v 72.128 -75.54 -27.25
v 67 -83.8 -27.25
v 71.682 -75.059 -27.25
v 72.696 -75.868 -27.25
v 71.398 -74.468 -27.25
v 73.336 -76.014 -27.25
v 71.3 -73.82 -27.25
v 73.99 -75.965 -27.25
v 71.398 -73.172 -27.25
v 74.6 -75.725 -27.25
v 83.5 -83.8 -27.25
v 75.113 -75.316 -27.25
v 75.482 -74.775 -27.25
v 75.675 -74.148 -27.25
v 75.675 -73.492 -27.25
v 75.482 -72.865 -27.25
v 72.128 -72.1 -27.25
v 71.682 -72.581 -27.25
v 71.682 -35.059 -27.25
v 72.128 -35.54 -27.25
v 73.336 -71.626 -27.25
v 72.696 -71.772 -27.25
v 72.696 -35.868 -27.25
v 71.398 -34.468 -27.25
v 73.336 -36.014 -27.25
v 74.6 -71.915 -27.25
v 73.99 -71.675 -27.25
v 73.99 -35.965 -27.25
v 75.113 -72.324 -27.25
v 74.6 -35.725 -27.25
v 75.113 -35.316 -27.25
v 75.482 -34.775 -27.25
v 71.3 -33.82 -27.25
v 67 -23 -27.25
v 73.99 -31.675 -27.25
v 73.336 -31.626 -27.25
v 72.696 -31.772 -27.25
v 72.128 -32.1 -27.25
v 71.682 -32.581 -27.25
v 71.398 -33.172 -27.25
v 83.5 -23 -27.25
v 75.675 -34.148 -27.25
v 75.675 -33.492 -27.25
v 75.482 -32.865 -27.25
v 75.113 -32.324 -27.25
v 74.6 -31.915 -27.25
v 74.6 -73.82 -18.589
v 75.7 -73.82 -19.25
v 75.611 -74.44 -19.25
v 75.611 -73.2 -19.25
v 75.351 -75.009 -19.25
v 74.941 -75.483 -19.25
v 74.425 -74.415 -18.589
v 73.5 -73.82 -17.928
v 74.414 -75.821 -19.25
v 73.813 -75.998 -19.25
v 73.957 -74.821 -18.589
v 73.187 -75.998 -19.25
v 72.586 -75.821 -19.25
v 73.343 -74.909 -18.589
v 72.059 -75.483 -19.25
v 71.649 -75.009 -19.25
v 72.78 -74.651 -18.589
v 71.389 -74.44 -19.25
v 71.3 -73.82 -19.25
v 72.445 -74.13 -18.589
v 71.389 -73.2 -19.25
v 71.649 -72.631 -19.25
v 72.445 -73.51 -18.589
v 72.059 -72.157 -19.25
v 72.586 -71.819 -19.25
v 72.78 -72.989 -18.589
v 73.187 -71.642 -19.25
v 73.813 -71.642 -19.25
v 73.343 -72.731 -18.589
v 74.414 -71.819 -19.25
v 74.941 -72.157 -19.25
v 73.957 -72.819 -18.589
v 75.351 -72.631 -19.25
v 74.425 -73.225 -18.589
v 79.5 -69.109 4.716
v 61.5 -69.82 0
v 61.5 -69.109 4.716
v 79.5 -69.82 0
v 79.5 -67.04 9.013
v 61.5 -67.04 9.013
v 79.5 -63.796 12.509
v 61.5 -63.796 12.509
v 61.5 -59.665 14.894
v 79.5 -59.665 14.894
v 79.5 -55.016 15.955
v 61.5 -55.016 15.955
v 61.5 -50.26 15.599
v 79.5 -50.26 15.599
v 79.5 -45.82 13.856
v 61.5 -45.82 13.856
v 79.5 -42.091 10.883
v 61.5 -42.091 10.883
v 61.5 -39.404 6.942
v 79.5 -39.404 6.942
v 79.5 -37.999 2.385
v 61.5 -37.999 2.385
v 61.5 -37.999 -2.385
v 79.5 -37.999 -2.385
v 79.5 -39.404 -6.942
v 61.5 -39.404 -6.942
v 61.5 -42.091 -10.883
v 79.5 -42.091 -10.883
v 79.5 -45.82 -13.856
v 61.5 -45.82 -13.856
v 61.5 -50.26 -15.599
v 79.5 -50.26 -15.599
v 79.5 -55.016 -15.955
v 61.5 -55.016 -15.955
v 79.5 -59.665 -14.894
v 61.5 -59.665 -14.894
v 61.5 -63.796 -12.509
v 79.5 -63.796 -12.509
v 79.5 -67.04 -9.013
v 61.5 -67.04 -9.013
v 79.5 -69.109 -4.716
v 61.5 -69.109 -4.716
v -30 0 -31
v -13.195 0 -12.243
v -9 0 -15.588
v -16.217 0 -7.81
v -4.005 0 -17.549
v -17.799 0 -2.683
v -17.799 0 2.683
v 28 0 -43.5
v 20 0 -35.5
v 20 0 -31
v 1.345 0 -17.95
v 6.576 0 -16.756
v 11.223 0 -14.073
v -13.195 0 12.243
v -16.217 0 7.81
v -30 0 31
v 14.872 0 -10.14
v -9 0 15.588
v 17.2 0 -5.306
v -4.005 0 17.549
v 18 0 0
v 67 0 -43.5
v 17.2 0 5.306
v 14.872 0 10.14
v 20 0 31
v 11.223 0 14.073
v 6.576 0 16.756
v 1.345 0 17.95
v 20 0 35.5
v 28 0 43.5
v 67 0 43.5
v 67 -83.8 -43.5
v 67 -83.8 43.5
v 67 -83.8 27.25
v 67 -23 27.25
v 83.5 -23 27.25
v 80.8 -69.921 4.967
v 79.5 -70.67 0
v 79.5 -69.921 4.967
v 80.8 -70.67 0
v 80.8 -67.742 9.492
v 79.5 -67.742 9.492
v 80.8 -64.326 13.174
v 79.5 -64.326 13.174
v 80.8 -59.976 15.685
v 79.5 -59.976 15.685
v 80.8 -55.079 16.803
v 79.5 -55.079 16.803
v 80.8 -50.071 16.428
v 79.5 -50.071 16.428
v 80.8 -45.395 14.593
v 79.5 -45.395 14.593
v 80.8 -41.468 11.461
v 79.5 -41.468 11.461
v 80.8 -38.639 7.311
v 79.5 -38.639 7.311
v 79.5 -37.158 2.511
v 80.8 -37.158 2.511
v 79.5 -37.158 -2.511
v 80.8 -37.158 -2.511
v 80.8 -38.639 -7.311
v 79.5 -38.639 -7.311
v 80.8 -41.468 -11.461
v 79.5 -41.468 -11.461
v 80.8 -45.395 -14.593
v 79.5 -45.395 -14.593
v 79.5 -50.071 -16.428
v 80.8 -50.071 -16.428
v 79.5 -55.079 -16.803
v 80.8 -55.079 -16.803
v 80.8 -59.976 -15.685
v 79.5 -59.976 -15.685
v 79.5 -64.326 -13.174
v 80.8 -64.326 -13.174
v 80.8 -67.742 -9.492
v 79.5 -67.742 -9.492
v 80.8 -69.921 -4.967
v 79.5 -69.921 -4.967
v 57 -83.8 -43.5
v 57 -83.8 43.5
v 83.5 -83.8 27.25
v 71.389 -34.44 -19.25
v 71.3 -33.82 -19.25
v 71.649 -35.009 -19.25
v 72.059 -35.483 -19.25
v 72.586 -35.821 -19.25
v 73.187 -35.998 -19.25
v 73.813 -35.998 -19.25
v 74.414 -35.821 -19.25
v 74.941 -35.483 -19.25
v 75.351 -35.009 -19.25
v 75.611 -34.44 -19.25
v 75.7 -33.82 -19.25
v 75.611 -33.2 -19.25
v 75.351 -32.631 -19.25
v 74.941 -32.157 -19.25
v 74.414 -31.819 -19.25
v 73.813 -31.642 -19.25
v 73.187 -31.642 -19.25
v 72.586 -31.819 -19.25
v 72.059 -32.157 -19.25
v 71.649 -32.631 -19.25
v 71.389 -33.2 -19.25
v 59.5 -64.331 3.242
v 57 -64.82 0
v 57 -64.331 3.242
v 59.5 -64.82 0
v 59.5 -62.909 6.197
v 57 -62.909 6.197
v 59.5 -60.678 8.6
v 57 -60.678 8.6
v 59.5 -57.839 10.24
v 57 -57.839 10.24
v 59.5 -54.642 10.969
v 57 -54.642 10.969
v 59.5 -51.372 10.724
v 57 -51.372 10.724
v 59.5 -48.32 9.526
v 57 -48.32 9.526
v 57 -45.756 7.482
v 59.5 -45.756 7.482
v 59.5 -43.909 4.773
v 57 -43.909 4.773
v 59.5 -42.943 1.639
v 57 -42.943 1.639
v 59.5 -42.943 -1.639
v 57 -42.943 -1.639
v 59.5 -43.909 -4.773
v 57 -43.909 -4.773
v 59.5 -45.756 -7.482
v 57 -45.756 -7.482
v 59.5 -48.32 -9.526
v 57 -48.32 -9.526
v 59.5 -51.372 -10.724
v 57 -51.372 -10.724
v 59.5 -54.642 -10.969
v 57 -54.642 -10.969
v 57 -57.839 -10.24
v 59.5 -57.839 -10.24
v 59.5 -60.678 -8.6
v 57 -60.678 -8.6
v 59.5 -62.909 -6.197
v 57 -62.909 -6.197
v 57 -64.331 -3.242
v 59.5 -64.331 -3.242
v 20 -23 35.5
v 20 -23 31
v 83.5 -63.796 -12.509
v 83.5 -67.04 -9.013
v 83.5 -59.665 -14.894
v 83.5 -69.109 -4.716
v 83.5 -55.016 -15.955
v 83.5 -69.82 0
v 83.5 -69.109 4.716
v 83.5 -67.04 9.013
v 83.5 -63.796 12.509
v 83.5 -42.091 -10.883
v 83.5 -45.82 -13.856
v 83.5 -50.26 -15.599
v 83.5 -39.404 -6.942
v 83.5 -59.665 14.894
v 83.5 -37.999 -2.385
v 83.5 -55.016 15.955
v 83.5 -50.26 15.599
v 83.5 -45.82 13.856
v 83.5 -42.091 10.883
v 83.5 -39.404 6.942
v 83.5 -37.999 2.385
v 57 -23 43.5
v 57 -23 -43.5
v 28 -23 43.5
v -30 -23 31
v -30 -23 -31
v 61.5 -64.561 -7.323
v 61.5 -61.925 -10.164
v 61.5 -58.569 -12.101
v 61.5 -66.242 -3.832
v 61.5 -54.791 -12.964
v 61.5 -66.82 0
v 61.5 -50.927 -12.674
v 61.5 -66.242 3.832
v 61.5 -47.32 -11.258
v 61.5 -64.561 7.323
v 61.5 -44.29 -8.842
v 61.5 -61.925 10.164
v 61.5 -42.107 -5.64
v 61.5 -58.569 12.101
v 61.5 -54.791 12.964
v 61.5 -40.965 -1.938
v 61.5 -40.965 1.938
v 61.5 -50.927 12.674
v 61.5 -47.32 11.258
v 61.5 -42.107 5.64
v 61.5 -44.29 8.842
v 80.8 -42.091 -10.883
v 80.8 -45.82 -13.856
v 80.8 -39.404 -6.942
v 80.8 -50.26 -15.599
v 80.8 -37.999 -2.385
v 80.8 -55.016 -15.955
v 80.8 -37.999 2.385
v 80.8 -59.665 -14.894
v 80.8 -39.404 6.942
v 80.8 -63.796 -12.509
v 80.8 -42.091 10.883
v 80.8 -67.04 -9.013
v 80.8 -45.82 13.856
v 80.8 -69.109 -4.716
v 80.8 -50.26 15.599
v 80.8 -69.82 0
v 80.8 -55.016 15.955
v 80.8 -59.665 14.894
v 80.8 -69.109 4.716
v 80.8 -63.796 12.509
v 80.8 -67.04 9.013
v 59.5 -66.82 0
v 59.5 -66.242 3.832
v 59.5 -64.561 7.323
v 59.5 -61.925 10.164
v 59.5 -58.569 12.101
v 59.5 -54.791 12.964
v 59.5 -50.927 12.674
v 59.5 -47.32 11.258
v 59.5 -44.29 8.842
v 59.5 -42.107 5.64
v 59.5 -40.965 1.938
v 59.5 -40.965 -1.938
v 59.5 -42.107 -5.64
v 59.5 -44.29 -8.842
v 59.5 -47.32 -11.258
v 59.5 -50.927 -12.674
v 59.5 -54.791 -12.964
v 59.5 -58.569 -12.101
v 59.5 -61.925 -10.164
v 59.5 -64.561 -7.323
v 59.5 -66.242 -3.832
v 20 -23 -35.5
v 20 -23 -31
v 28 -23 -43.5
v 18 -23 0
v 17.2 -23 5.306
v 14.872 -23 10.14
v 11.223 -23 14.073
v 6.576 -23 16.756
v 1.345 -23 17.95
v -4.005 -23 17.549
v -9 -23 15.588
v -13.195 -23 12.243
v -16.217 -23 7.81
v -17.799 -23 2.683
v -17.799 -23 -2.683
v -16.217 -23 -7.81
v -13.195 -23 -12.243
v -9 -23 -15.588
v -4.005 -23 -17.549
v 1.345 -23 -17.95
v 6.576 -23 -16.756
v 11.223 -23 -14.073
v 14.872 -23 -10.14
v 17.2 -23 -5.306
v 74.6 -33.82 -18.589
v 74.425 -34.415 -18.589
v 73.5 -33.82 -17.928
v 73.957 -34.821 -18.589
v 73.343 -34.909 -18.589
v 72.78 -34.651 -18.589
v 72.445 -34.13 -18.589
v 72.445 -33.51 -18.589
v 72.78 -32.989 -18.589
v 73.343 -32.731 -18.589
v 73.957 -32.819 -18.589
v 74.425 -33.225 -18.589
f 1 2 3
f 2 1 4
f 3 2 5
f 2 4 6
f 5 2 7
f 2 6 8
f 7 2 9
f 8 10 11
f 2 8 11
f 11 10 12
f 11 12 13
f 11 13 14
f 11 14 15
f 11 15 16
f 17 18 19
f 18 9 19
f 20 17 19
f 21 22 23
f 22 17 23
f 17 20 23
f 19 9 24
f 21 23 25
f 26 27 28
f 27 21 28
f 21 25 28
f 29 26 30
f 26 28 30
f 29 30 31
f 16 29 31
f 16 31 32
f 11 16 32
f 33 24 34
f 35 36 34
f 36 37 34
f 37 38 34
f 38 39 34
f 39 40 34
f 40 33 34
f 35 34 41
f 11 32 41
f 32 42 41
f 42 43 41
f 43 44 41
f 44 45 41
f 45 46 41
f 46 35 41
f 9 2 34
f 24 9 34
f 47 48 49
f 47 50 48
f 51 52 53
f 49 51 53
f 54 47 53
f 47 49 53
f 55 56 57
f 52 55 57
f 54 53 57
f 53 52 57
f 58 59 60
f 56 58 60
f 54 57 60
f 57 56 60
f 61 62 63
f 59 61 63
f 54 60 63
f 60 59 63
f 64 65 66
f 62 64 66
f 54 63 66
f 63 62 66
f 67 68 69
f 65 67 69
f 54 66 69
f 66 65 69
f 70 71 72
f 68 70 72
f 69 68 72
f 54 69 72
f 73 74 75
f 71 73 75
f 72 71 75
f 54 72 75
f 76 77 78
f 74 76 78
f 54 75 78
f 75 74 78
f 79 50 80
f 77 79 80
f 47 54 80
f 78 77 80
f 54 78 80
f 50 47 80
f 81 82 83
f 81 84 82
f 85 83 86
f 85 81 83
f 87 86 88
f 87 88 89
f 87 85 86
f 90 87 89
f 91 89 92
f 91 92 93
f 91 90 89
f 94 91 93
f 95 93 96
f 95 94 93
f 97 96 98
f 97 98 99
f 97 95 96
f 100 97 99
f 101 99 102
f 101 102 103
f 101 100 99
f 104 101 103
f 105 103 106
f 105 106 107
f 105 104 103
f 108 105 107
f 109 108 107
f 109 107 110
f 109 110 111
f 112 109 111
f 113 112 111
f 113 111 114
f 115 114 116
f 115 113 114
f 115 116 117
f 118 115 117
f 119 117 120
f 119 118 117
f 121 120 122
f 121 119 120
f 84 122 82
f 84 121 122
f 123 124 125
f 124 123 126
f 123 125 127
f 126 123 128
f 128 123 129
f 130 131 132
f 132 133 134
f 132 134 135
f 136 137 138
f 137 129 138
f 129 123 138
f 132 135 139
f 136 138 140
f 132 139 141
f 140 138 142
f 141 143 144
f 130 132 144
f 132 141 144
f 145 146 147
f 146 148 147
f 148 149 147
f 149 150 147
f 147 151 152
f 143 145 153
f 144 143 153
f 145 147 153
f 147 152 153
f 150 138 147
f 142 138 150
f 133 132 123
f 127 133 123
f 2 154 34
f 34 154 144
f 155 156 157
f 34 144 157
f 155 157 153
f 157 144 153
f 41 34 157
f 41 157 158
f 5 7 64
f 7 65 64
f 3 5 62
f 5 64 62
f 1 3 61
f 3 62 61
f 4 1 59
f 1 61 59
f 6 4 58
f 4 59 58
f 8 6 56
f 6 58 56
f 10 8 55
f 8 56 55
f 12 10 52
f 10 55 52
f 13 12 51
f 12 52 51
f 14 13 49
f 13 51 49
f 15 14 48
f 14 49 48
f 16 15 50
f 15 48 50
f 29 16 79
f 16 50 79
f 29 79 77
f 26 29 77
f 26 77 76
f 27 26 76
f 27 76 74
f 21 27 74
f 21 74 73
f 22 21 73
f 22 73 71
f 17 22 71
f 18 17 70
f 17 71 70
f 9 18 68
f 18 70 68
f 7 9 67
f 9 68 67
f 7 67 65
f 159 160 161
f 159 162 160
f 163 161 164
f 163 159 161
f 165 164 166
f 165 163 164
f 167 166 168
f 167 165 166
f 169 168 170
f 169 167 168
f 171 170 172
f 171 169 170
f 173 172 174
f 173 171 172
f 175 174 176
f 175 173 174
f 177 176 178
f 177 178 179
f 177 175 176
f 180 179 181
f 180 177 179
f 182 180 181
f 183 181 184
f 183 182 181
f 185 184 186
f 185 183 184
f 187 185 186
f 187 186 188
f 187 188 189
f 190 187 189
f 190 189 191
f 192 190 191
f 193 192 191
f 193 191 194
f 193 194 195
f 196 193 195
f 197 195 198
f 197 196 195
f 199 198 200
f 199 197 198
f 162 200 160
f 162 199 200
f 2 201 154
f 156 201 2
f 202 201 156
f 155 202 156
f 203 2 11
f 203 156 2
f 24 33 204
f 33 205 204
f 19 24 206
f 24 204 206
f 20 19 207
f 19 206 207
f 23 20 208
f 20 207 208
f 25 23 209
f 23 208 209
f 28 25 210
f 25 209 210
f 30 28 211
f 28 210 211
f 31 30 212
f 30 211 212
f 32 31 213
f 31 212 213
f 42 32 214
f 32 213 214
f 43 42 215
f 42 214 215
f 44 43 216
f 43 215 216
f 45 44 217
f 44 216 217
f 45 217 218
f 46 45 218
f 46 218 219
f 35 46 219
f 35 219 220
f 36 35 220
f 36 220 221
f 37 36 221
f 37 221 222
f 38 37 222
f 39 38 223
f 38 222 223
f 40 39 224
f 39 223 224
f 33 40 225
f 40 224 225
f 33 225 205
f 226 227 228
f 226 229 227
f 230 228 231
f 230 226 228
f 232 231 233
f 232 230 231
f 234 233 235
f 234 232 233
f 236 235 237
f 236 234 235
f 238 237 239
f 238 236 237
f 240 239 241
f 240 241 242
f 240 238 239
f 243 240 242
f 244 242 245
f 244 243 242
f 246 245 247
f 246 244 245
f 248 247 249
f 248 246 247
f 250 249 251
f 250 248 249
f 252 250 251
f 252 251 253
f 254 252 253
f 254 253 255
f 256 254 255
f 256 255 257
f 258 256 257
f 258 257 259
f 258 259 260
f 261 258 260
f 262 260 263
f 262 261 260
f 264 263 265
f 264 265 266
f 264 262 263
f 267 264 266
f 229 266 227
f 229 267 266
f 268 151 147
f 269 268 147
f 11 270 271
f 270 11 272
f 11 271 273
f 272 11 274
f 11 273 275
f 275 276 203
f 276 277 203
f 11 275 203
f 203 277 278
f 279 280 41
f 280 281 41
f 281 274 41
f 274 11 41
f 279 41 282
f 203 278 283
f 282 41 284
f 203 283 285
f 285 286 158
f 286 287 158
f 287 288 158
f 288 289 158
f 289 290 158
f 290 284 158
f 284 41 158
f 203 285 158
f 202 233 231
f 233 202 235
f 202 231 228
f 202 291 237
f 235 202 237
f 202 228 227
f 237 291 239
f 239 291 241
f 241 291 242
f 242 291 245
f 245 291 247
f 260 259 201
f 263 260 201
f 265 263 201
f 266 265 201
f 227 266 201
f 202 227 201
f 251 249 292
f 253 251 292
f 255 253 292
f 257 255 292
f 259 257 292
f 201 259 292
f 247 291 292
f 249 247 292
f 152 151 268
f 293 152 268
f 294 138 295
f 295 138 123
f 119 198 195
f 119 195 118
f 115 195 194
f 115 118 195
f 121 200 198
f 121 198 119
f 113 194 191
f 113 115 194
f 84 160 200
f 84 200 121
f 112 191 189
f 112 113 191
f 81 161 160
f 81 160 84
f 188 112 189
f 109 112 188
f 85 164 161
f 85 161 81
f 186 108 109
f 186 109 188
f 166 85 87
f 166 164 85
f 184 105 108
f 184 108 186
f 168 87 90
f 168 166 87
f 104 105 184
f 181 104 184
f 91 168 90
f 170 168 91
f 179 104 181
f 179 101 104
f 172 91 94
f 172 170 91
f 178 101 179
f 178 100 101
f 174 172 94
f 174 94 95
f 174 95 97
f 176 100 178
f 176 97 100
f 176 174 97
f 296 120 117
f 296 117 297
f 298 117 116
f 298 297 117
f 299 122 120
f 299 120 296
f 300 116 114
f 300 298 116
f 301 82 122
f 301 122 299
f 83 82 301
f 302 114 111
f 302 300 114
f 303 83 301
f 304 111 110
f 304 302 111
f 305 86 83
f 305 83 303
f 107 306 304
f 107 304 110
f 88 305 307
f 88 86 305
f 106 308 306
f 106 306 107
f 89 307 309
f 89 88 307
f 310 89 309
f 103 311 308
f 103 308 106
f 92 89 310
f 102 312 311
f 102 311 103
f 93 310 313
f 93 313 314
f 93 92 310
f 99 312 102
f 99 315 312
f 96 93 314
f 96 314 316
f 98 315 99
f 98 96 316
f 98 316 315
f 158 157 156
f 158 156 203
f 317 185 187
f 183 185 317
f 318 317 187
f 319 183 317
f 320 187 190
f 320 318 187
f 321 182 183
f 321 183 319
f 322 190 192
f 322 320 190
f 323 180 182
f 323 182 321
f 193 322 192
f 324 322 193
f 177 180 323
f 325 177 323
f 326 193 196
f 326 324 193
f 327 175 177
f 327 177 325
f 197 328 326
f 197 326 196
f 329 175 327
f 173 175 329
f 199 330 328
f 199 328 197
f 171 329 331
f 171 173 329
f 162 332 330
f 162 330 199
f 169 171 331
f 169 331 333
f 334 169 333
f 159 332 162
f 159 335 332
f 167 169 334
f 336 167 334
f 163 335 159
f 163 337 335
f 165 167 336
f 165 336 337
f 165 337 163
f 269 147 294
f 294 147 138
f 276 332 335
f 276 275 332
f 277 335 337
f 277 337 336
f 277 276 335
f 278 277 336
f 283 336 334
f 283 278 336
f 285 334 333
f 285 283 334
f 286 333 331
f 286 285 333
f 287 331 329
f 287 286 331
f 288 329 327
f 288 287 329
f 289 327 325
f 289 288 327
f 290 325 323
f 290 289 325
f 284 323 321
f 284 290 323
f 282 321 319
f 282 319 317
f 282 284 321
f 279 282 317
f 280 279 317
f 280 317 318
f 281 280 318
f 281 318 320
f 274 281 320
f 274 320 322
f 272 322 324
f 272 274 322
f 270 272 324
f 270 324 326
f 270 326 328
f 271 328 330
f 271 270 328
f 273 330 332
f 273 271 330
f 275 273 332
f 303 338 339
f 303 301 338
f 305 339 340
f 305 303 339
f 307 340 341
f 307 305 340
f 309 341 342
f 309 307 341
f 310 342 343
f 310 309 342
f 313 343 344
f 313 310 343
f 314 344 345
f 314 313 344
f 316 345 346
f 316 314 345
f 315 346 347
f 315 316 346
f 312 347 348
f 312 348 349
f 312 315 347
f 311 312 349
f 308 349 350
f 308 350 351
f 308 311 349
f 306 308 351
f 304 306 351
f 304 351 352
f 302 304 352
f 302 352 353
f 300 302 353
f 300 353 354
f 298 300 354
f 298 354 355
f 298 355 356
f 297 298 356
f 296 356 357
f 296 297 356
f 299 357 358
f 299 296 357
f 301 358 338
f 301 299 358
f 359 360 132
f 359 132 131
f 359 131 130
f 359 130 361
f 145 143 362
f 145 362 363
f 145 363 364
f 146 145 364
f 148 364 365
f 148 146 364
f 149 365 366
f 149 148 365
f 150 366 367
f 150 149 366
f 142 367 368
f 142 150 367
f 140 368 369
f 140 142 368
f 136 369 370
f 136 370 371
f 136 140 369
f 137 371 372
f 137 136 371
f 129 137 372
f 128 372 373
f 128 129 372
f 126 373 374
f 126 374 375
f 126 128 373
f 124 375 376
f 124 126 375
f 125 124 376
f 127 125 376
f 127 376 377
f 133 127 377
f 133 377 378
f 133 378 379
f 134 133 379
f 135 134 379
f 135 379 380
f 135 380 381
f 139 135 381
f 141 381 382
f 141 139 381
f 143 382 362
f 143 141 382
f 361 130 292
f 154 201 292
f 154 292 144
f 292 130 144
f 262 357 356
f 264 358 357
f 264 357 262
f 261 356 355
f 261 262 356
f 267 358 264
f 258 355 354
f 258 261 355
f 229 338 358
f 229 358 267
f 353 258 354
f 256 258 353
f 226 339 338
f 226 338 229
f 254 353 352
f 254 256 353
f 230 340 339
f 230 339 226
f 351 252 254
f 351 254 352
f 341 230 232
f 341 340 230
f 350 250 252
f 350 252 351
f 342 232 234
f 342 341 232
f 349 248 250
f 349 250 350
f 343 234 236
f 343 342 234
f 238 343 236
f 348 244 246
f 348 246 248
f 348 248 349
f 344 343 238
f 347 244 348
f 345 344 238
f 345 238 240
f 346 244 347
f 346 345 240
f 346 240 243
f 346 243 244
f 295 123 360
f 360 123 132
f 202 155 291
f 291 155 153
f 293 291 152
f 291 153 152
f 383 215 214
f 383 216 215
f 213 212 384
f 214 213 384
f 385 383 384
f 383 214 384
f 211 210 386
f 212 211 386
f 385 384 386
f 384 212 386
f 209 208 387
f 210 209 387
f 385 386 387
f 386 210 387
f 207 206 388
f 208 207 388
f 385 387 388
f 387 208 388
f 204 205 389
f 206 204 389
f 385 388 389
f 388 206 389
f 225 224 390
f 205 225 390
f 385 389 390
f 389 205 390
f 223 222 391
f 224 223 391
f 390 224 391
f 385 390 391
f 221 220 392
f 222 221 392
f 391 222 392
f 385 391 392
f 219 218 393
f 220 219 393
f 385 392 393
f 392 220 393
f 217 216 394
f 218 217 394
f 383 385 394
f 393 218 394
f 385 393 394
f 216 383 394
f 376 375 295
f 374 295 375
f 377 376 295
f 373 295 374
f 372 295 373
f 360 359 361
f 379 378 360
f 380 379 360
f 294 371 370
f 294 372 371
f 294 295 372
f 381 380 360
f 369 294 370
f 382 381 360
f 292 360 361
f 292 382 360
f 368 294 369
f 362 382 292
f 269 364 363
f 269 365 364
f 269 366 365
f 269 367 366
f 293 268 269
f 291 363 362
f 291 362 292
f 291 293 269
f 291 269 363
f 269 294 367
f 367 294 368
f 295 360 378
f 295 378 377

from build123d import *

# Parameters (mm, degrees)
F0_R     = 18
F1_DEPTH = 23
F2_DEPTH = 83.8
F3_START = 23
F0_W     = 16.5
F0_H     = 54.5
F3_DEPTH = 60.8
F6_SIZE2 = 8
F6_SIZE  = 8
F8_D     = 4.4
F8_DEPTH = 8
F8_TIP   = 1.3218933619


with BuildPart() as f1:
    # F0 (on Front) → F1 (new body)
    with BuildSketch(Plane.XZ):
        Polygon((-30, 31), (-30, -31), (20, -31), (20, -43.5), (57, -43.5), (57, 43.5), (20, 43.5), (20, 31), align=None)
        Circle(F0_R, mode=Mode.SUBTRACT)
    extrude(amount=F1_DEPTH)

    # F0 (on Front) → F2 (join)
    with BuildSketch(Plane.XZ):
        Polygon((57, 43.5), (57, -43.5), (67, -43.5), (67, -27.25), (67, 27.25), (67, 43.5), align=None)
    extrude(amount=F2_DEPTH)

    # F0 (on Front) → F3 (join)
    with BuildSketch(Plane.XZ.offset(F3_START)):
        with Locations((75.25, 0)):
            Rectangle(F0_W, F0_H)
    extrude(amount=F3_DEPTH)

    # F4 (on Top) → F5 (revolve, cut)
    with BuildSketch(Plane.XY):
        Polygon((57, -53.82), (57, -64.82), (59.5, -64.82), (59.5, -66.82), (61.5, -66.82), (61.5, -69.82), (79.5, -69.82), (79.5, -70.67), (80.8, -70.67), (80.8, -69.82), (83.5, -69.82), (83.5, -53.82), align=None)
    revolve(axis=Axis((70.25, -53.82, 0), (-1, 0, 0)), mode=Mode.SUBTRACT)

    # F6
    f6_edges = [f1.edges().sort_by_distance(p)[0] for p in [
        (20, -11.5, 43.5),
        (20, -11.5, -43.5),
    ]]
    chamfer(f6_edges, length=F6_SIZE, length2=F6_SIZE2)

    # F8
    with Locations(Plane(origin=(0, 0, -27.25), x_dir=(1, 0, 0), z_dir=(0, 0, -1))):
        with Locations((73.5, 73.82), (73.5, 33.82)):
            Hole(F8_D / 2, depth=F8_DEPTH)
            with Locations((0, 0, -(F8_DEPTH + F8_TIP / 2))):  # 118° drill point
                Cone(0, F8_D / 2, F8_TIP, mode=Mode.SUBTRACT)


solid = f1.part
